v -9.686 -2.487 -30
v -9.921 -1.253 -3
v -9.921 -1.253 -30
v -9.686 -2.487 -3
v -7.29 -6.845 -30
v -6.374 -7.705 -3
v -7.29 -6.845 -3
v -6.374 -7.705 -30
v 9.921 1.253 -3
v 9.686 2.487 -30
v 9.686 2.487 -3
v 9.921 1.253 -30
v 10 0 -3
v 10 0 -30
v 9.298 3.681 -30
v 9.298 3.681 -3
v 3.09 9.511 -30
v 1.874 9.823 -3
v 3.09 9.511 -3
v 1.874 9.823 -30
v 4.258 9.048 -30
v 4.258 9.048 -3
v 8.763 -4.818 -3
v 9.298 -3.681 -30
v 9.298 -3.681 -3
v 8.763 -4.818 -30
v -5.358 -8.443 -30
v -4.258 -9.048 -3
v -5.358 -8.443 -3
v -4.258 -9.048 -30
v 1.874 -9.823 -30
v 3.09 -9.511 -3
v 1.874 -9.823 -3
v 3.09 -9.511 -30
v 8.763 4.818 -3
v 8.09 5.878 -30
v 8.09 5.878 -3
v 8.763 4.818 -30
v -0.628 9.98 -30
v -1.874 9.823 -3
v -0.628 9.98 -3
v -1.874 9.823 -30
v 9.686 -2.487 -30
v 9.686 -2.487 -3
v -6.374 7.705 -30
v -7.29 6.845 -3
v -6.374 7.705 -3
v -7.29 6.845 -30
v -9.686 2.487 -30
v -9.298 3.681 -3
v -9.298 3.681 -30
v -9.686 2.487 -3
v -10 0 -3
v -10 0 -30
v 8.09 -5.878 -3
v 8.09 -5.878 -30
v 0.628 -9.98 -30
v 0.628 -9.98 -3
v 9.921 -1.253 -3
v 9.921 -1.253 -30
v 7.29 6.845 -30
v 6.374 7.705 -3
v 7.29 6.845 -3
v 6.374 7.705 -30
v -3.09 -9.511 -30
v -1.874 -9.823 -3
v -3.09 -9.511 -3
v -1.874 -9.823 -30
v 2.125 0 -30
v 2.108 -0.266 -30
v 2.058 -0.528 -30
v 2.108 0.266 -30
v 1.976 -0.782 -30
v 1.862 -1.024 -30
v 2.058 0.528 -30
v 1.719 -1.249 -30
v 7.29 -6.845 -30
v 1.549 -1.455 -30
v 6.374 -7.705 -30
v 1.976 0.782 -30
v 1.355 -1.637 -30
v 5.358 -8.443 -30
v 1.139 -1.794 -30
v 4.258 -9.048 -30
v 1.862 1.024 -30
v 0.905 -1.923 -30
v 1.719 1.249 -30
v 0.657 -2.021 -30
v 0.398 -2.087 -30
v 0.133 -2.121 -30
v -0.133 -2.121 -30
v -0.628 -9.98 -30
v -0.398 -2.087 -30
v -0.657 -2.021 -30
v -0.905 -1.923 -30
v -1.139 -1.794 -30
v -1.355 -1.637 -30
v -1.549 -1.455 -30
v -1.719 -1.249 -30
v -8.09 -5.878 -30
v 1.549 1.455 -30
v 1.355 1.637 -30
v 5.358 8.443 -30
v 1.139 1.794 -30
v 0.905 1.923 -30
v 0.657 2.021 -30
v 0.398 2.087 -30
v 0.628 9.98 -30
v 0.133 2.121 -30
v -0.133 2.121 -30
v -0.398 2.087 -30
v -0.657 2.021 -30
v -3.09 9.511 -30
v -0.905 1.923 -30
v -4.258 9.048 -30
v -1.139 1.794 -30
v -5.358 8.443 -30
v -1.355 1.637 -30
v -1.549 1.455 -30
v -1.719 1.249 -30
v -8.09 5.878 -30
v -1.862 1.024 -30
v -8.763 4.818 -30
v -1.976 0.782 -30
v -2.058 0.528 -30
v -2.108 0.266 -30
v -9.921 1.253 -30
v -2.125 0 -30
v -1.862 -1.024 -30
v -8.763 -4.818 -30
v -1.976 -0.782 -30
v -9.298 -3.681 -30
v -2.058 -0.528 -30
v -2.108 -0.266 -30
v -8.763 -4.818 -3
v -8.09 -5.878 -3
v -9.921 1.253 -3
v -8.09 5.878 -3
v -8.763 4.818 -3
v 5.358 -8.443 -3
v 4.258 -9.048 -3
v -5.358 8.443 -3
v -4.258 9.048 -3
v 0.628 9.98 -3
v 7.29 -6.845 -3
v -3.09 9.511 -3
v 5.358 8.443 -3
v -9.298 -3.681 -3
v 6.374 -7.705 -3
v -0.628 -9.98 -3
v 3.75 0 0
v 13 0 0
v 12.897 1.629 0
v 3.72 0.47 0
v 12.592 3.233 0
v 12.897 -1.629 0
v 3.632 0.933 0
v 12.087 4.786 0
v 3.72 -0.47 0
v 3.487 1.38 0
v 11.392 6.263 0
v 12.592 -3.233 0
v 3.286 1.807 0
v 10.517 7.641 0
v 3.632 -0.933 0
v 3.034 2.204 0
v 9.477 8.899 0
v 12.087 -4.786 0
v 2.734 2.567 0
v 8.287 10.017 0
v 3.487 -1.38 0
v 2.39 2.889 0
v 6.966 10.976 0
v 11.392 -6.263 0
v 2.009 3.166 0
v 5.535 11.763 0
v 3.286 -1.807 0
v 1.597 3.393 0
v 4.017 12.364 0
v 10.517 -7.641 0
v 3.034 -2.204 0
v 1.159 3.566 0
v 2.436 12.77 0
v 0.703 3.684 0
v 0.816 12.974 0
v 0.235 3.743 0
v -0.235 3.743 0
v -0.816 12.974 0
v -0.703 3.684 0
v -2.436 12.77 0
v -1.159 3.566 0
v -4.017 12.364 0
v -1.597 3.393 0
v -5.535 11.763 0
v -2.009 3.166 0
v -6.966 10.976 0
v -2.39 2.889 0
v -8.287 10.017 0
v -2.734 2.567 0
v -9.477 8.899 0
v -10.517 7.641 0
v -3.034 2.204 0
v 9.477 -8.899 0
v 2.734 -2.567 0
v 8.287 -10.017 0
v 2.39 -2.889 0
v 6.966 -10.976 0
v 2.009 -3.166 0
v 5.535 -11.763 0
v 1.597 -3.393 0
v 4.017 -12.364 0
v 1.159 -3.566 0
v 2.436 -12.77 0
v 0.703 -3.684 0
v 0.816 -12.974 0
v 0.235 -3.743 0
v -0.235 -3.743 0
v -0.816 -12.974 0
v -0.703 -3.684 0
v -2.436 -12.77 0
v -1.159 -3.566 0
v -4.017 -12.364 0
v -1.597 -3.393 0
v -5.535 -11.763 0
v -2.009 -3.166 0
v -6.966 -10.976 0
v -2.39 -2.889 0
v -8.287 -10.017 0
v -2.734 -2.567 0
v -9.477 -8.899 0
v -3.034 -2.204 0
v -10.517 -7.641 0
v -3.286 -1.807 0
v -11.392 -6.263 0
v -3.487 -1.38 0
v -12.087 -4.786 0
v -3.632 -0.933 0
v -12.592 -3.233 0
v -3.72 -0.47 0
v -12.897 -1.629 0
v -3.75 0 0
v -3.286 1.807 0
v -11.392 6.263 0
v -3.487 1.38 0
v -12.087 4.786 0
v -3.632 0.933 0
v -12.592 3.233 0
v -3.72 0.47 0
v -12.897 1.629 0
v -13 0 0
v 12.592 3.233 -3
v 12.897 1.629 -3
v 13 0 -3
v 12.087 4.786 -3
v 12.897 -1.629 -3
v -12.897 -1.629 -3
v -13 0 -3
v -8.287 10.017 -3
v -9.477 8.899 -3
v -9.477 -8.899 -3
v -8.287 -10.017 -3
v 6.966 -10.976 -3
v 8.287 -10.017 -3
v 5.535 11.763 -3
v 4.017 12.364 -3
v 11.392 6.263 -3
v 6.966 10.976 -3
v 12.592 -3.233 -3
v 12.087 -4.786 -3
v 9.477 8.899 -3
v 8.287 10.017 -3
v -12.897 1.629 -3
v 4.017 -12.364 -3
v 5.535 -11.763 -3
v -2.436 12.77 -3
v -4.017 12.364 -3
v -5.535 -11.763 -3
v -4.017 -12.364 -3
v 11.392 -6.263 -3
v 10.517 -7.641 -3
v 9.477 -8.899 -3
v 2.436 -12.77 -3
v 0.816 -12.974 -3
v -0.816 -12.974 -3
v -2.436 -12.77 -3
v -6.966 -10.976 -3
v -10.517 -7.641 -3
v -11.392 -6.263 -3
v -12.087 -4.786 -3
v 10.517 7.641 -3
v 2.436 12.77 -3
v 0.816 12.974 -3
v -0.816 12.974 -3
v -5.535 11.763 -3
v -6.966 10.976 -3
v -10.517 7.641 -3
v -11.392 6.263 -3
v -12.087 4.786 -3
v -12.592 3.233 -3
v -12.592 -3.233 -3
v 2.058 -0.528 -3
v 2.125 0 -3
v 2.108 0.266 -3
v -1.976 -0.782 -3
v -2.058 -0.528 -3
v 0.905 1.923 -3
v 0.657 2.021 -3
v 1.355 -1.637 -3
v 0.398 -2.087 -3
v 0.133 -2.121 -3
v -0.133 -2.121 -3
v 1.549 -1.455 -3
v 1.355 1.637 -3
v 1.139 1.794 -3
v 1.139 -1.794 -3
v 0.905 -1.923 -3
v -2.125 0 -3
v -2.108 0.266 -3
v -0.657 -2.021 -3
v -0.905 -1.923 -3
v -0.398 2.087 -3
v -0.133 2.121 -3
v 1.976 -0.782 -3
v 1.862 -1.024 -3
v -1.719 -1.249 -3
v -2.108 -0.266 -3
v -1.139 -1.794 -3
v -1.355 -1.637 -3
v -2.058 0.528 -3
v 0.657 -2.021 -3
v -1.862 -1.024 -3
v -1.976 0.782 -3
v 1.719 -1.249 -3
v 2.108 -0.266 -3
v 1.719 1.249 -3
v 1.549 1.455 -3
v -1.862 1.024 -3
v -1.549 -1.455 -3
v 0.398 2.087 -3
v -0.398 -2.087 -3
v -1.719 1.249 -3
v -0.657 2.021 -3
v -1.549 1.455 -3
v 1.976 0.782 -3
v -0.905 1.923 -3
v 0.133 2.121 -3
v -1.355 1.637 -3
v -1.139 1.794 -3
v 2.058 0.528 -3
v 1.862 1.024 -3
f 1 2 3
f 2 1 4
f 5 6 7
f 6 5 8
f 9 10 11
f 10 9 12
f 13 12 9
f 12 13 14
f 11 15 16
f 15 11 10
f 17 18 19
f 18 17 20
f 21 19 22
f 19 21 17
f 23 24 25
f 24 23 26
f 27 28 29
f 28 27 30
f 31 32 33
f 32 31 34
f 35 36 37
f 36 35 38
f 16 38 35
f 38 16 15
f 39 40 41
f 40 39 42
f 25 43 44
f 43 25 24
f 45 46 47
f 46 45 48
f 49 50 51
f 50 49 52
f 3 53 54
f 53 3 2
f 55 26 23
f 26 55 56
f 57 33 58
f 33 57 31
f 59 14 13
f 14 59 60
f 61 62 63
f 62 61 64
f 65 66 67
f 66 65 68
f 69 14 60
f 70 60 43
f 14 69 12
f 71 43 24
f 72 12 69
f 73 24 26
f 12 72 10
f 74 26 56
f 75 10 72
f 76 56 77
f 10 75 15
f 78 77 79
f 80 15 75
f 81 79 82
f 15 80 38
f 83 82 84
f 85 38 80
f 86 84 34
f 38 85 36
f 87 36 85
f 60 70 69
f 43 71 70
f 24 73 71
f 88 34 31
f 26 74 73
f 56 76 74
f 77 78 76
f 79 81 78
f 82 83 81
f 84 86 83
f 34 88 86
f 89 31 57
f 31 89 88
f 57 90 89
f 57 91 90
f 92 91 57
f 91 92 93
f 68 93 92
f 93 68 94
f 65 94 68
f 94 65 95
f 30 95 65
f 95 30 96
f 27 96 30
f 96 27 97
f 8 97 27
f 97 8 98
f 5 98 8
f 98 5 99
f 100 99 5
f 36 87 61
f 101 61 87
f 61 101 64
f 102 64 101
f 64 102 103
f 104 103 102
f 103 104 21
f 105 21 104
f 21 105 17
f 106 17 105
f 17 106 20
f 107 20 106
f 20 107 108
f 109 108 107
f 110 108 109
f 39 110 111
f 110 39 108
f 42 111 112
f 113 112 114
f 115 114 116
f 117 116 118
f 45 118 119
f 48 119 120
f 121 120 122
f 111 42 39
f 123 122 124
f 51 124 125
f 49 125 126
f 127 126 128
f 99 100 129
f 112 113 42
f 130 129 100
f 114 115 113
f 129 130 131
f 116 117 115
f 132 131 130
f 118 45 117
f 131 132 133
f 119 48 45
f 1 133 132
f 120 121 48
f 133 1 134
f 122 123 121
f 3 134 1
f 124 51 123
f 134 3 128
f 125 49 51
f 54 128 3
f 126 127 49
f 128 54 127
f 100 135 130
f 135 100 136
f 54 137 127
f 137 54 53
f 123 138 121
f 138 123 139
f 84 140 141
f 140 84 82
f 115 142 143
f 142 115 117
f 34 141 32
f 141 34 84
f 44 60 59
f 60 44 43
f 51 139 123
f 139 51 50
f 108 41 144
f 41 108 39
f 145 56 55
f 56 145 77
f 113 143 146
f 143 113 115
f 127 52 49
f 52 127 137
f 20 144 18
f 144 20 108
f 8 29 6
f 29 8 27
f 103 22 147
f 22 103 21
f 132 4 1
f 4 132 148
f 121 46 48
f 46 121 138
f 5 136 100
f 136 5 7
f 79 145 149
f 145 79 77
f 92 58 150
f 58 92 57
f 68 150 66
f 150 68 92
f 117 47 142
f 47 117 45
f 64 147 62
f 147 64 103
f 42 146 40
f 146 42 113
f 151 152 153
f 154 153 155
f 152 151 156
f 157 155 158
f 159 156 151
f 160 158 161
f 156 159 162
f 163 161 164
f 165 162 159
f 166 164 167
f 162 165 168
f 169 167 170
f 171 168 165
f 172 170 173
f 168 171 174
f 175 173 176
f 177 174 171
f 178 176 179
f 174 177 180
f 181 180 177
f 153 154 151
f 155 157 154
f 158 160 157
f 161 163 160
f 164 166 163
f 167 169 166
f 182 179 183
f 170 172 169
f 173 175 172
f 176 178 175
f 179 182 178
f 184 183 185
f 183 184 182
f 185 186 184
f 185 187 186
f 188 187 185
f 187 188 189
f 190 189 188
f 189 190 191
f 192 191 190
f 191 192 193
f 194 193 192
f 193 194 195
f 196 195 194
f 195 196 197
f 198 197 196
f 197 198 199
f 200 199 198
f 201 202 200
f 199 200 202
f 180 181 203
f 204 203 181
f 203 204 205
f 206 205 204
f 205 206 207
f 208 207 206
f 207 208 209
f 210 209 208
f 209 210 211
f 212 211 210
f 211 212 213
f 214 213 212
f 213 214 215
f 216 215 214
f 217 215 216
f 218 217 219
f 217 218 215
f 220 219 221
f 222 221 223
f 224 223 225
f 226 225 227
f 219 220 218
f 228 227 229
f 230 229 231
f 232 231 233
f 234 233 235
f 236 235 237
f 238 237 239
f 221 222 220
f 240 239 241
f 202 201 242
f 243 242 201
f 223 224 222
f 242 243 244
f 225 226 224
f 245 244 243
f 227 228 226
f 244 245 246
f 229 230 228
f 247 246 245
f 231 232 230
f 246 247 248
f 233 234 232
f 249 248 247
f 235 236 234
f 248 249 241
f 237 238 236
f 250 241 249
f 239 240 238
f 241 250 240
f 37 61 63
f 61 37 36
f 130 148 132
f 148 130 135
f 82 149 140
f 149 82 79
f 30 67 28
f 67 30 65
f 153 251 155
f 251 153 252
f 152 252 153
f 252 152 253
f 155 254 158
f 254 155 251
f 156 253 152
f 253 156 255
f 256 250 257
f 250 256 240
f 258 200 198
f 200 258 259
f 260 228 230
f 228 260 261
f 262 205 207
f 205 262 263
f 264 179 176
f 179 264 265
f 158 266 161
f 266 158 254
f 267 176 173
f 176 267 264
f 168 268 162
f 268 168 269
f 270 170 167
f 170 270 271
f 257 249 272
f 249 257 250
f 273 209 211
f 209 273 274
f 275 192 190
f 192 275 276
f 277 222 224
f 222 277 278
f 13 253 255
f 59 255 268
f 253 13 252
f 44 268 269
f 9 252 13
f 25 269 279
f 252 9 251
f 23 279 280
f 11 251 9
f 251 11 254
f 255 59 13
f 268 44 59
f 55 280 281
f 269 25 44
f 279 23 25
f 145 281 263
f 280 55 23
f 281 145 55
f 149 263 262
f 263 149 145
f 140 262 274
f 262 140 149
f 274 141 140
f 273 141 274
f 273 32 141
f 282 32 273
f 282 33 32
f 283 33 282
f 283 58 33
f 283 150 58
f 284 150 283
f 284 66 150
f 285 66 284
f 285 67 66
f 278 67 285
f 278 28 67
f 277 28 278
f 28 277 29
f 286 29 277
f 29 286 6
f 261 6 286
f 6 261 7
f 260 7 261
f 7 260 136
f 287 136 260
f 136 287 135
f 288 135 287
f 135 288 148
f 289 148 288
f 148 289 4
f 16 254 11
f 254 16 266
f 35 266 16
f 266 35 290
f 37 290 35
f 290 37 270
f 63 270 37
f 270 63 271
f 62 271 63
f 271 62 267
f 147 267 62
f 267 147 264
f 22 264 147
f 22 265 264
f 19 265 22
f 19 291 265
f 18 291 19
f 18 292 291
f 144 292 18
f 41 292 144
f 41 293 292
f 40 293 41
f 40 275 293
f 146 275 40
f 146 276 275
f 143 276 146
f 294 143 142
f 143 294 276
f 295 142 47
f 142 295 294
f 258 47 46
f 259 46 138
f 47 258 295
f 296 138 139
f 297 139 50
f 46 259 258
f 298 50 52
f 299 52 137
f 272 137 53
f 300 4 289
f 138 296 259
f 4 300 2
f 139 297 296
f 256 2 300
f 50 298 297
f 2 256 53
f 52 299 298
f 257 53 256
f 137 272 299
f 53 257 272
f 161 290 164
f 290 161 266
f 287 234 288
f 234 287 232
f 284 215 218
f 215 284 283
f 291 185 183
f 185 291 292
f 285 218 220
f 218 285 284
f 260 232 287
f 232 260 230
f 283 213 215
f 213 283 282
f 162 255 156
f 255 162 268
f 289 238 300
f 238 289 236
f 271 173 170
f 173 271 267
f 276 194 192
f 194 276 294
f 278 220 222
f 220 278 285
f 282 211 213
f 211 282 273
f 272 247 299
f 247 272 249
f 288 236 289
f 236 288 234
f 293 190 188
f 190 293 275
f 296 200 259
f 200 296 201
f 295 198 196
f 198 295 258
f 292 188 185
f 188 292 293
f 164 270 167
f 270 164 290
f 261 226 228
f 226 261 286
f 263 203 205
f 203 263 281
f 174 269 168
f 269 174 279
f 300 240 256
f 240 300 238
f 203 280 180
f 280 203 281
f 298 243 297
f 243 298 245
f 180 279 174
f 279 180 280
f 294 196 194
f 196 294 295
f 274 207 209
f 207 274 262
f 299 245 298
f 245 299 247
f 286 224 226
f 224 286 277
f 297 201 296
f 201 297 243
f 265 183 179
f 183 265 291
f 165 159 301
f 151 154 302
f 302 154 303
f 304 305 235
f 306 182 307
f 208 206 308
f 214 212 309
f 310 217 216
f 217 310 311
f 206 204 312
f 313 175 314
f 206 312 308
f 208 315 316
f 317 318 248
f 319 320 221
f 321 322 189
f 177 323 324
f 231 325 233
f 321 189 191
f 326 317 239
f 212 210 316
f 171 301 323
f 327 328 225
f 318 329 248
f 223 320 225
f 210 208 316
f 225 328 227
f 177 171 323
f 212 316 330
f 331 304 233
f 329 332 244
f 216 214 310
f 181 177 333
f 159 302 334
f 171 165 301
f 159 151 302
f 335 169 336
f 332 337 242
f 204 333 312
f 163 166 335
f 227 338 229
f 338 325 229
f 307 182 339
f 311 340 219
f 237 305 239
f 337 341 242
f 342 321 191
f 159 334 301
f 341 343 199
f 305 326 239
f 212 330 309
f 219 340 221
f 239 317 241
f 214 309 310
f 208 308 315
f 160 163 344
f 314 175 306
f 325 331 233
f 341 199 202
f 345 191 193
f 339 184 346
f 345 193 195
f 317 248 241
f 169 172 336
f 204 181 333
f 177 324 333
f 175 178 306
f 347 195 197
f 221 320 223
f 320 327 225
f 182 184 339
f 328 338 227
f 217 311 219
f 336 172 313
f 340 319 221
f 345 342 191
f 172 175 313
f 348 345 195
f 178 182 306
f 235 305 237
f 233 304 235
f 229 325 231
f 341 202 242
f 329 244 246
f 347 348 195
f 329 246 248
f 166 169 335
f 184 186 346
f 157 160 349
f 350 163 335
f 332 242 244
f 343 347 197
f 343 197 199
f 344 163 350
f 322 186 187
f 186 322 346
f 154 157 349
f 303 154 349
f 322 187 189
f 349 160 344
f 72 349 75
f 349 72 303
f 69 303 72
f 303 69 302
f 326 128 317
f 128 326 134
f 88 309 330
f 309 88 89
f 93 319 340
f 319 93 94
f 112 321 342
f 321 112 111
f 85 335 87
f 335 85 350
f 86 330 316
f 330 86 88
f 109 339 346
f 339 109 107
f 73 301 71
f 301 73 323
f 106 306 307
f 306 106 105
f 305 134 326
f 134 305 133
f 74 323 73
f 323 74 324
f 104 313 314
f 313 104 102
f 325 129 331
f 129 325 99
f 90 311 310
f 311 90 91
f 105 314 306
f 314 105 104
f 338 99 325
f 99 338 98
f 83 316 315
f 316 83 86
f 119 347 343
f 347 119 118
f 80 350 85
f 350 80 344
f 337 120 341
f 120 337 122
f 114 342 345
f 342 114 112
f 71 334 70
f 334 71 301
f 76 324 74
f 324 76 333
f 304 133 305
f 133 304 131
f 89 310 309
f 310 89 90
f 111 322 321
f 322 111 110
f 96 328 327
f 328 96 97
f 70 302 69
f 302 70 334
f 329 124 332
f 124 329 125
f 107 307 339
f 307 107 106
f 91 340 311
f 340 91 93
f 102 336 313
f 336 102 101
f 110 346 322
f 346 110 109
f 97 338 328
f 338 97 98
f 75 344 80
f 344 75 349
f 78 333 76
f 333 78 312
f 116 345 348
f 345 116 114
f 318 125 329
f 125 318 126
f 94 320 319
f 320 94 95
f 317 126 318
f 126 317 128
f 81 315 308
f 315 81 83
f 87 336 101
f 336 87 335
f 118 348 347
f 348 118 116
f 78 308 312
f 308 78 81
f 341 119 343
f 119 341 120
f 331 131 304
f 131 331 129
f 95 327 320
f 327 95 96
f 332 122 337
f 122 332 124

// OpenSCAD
$fn = 50;


difference() {
	union() {
		translate(v = [0, 0, -30.0000000000]) {
			cylinder(h = 30, r = 10.0000000000);
		}
		translate(v = [0, 0, -3.0000000000]) {
			cylinder(h = 3, r = 13.0000000000);
		}
	}
	union() {
		translate(v = [0, 0, 0]) {
			rotate(a = [0, 0, 0]) {
				difference() {
					union() {
						#translate(v = [0, 0, -30.0000000000]) {
							cylinder(h = 30, r = 2.0000000000);
						}
						#translate(v = [0, 0, -3]) {
							cylinder(h = 3, r = 10.0000000000, r1 = 2.1250000000, r2 = 3.7500000000);
						}
						#translate(v = [0, 0, -30.0000000000]) {
							cylinder(h = 30, r = 2.1250000000);
						}
						#translate(v = [0, 0, -30.0000000000]) {
							cylinder(h = 30, r = 2.0000000000);
						}
					}
					union();
				}
			}
		}
	}
}
